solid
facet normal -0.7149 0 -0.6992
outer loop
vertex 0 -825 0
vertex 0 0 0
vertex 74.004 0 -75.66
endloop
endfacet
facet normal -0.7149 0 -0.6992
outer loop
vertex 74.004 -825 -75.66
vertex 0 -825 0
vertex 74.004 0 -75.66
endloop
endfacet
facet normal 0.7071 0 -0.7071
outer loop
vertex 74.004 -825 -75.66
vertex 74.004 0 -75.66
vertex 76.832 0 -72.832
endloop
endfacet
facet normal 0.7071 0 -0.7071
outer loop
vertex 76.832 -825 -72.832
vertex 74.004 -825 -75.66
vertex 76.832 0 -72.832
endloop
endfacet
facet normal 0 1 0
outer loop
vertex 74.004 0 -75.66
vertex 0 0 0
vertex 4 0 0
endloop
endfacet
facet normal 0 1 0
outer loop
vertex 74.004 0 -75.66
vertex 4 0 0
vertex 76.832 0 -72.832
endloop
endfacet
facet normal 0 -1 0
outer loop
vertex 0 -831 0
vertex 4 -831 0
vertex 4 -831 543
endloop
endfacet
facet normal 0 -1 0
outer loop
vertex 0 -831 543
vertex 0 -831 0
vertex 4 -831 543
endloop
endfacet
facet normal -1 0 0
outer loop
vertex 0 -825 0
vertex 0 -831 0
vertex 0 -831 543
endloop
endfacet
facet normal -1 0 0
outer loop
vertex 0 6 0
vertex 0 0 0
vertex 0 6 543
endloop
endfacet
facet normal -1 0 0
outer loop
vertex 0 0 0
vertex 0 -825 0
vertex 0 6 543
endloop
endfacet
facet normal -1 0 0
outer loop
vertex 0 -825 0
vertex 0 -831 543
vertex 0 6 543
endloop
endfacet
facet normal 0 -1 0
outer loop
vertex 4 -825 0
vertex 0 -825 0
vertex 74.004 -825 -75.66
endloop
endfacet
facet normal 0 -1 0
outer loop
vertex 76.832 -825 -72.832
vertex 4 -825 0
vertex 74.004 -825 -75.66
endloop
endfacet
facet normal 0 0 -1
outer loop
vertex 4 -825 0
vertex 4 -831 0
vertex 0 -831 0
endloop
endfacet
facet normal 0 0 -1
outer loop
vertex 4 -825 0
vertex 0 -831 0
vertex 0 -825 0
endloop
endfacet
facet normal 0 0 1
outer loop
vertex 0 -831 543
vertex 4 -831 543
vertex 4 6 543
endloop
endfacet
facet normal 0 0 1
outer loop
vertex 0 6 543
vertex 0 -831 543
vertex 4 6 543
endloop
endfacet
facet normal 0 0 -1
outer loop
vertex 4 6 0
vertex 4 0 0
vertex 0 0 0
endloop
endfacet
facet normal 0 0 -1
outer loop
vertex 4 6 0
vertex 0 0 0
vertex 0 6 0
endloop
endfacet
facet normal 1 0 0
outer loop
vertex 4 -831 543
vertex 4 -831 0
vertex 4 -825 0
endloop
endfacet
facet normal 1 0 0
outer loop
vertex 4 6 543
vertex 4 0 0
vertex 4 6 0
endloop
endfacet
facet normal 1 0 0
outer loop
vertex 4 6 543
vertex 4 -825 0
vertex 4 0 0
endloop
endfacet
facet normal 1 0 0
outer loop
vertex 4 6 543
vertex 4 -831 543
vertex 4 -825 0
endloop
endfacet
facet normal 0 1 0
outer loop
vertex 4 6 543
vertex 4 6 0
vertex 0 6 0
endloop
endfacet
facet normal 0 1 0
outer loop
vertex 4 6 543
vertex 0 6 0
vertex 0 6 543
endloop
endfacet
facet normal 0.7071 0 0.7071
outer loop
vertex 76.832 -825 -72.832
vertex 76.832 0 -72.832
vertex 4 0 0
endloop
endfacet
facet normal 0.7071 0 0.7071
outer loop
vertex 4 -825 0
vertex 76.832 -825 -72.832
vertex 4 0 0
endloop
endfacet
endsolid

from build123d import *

# Parameters (mm, degrees)
F0_W     = 4
F0_H     = 543
F1_DEPTH = 825
F2_W     = 6
F2_H     = 543
F3_DEPTH = 4


with BuildPart() as f1:
    # F0 (on Front) → F1 (new body)
    with BuildSketch(Plane.XZ):
        with Locations((2, 271.5)):
            Rectangle(F0_W, F0_H)
        Polygon((4, 0), (0, 0), (74.003571, -75.660426), (76.831998, -72.831998), align=None)
    extrude(amount=F1_DEPTH)

    # F2 (on face) → F3 (join)
    with BuildSketch(Plane.YZ.offset(4)):
        with Locations((3, 271.5)):
            Rectangle(F2_W, F2_H)
        with Locations((-828, 271.5)):
            Rectangle(F2_W, F2_H)
    extrude(amount=-F3_DEPTH)


solid = f1.part
